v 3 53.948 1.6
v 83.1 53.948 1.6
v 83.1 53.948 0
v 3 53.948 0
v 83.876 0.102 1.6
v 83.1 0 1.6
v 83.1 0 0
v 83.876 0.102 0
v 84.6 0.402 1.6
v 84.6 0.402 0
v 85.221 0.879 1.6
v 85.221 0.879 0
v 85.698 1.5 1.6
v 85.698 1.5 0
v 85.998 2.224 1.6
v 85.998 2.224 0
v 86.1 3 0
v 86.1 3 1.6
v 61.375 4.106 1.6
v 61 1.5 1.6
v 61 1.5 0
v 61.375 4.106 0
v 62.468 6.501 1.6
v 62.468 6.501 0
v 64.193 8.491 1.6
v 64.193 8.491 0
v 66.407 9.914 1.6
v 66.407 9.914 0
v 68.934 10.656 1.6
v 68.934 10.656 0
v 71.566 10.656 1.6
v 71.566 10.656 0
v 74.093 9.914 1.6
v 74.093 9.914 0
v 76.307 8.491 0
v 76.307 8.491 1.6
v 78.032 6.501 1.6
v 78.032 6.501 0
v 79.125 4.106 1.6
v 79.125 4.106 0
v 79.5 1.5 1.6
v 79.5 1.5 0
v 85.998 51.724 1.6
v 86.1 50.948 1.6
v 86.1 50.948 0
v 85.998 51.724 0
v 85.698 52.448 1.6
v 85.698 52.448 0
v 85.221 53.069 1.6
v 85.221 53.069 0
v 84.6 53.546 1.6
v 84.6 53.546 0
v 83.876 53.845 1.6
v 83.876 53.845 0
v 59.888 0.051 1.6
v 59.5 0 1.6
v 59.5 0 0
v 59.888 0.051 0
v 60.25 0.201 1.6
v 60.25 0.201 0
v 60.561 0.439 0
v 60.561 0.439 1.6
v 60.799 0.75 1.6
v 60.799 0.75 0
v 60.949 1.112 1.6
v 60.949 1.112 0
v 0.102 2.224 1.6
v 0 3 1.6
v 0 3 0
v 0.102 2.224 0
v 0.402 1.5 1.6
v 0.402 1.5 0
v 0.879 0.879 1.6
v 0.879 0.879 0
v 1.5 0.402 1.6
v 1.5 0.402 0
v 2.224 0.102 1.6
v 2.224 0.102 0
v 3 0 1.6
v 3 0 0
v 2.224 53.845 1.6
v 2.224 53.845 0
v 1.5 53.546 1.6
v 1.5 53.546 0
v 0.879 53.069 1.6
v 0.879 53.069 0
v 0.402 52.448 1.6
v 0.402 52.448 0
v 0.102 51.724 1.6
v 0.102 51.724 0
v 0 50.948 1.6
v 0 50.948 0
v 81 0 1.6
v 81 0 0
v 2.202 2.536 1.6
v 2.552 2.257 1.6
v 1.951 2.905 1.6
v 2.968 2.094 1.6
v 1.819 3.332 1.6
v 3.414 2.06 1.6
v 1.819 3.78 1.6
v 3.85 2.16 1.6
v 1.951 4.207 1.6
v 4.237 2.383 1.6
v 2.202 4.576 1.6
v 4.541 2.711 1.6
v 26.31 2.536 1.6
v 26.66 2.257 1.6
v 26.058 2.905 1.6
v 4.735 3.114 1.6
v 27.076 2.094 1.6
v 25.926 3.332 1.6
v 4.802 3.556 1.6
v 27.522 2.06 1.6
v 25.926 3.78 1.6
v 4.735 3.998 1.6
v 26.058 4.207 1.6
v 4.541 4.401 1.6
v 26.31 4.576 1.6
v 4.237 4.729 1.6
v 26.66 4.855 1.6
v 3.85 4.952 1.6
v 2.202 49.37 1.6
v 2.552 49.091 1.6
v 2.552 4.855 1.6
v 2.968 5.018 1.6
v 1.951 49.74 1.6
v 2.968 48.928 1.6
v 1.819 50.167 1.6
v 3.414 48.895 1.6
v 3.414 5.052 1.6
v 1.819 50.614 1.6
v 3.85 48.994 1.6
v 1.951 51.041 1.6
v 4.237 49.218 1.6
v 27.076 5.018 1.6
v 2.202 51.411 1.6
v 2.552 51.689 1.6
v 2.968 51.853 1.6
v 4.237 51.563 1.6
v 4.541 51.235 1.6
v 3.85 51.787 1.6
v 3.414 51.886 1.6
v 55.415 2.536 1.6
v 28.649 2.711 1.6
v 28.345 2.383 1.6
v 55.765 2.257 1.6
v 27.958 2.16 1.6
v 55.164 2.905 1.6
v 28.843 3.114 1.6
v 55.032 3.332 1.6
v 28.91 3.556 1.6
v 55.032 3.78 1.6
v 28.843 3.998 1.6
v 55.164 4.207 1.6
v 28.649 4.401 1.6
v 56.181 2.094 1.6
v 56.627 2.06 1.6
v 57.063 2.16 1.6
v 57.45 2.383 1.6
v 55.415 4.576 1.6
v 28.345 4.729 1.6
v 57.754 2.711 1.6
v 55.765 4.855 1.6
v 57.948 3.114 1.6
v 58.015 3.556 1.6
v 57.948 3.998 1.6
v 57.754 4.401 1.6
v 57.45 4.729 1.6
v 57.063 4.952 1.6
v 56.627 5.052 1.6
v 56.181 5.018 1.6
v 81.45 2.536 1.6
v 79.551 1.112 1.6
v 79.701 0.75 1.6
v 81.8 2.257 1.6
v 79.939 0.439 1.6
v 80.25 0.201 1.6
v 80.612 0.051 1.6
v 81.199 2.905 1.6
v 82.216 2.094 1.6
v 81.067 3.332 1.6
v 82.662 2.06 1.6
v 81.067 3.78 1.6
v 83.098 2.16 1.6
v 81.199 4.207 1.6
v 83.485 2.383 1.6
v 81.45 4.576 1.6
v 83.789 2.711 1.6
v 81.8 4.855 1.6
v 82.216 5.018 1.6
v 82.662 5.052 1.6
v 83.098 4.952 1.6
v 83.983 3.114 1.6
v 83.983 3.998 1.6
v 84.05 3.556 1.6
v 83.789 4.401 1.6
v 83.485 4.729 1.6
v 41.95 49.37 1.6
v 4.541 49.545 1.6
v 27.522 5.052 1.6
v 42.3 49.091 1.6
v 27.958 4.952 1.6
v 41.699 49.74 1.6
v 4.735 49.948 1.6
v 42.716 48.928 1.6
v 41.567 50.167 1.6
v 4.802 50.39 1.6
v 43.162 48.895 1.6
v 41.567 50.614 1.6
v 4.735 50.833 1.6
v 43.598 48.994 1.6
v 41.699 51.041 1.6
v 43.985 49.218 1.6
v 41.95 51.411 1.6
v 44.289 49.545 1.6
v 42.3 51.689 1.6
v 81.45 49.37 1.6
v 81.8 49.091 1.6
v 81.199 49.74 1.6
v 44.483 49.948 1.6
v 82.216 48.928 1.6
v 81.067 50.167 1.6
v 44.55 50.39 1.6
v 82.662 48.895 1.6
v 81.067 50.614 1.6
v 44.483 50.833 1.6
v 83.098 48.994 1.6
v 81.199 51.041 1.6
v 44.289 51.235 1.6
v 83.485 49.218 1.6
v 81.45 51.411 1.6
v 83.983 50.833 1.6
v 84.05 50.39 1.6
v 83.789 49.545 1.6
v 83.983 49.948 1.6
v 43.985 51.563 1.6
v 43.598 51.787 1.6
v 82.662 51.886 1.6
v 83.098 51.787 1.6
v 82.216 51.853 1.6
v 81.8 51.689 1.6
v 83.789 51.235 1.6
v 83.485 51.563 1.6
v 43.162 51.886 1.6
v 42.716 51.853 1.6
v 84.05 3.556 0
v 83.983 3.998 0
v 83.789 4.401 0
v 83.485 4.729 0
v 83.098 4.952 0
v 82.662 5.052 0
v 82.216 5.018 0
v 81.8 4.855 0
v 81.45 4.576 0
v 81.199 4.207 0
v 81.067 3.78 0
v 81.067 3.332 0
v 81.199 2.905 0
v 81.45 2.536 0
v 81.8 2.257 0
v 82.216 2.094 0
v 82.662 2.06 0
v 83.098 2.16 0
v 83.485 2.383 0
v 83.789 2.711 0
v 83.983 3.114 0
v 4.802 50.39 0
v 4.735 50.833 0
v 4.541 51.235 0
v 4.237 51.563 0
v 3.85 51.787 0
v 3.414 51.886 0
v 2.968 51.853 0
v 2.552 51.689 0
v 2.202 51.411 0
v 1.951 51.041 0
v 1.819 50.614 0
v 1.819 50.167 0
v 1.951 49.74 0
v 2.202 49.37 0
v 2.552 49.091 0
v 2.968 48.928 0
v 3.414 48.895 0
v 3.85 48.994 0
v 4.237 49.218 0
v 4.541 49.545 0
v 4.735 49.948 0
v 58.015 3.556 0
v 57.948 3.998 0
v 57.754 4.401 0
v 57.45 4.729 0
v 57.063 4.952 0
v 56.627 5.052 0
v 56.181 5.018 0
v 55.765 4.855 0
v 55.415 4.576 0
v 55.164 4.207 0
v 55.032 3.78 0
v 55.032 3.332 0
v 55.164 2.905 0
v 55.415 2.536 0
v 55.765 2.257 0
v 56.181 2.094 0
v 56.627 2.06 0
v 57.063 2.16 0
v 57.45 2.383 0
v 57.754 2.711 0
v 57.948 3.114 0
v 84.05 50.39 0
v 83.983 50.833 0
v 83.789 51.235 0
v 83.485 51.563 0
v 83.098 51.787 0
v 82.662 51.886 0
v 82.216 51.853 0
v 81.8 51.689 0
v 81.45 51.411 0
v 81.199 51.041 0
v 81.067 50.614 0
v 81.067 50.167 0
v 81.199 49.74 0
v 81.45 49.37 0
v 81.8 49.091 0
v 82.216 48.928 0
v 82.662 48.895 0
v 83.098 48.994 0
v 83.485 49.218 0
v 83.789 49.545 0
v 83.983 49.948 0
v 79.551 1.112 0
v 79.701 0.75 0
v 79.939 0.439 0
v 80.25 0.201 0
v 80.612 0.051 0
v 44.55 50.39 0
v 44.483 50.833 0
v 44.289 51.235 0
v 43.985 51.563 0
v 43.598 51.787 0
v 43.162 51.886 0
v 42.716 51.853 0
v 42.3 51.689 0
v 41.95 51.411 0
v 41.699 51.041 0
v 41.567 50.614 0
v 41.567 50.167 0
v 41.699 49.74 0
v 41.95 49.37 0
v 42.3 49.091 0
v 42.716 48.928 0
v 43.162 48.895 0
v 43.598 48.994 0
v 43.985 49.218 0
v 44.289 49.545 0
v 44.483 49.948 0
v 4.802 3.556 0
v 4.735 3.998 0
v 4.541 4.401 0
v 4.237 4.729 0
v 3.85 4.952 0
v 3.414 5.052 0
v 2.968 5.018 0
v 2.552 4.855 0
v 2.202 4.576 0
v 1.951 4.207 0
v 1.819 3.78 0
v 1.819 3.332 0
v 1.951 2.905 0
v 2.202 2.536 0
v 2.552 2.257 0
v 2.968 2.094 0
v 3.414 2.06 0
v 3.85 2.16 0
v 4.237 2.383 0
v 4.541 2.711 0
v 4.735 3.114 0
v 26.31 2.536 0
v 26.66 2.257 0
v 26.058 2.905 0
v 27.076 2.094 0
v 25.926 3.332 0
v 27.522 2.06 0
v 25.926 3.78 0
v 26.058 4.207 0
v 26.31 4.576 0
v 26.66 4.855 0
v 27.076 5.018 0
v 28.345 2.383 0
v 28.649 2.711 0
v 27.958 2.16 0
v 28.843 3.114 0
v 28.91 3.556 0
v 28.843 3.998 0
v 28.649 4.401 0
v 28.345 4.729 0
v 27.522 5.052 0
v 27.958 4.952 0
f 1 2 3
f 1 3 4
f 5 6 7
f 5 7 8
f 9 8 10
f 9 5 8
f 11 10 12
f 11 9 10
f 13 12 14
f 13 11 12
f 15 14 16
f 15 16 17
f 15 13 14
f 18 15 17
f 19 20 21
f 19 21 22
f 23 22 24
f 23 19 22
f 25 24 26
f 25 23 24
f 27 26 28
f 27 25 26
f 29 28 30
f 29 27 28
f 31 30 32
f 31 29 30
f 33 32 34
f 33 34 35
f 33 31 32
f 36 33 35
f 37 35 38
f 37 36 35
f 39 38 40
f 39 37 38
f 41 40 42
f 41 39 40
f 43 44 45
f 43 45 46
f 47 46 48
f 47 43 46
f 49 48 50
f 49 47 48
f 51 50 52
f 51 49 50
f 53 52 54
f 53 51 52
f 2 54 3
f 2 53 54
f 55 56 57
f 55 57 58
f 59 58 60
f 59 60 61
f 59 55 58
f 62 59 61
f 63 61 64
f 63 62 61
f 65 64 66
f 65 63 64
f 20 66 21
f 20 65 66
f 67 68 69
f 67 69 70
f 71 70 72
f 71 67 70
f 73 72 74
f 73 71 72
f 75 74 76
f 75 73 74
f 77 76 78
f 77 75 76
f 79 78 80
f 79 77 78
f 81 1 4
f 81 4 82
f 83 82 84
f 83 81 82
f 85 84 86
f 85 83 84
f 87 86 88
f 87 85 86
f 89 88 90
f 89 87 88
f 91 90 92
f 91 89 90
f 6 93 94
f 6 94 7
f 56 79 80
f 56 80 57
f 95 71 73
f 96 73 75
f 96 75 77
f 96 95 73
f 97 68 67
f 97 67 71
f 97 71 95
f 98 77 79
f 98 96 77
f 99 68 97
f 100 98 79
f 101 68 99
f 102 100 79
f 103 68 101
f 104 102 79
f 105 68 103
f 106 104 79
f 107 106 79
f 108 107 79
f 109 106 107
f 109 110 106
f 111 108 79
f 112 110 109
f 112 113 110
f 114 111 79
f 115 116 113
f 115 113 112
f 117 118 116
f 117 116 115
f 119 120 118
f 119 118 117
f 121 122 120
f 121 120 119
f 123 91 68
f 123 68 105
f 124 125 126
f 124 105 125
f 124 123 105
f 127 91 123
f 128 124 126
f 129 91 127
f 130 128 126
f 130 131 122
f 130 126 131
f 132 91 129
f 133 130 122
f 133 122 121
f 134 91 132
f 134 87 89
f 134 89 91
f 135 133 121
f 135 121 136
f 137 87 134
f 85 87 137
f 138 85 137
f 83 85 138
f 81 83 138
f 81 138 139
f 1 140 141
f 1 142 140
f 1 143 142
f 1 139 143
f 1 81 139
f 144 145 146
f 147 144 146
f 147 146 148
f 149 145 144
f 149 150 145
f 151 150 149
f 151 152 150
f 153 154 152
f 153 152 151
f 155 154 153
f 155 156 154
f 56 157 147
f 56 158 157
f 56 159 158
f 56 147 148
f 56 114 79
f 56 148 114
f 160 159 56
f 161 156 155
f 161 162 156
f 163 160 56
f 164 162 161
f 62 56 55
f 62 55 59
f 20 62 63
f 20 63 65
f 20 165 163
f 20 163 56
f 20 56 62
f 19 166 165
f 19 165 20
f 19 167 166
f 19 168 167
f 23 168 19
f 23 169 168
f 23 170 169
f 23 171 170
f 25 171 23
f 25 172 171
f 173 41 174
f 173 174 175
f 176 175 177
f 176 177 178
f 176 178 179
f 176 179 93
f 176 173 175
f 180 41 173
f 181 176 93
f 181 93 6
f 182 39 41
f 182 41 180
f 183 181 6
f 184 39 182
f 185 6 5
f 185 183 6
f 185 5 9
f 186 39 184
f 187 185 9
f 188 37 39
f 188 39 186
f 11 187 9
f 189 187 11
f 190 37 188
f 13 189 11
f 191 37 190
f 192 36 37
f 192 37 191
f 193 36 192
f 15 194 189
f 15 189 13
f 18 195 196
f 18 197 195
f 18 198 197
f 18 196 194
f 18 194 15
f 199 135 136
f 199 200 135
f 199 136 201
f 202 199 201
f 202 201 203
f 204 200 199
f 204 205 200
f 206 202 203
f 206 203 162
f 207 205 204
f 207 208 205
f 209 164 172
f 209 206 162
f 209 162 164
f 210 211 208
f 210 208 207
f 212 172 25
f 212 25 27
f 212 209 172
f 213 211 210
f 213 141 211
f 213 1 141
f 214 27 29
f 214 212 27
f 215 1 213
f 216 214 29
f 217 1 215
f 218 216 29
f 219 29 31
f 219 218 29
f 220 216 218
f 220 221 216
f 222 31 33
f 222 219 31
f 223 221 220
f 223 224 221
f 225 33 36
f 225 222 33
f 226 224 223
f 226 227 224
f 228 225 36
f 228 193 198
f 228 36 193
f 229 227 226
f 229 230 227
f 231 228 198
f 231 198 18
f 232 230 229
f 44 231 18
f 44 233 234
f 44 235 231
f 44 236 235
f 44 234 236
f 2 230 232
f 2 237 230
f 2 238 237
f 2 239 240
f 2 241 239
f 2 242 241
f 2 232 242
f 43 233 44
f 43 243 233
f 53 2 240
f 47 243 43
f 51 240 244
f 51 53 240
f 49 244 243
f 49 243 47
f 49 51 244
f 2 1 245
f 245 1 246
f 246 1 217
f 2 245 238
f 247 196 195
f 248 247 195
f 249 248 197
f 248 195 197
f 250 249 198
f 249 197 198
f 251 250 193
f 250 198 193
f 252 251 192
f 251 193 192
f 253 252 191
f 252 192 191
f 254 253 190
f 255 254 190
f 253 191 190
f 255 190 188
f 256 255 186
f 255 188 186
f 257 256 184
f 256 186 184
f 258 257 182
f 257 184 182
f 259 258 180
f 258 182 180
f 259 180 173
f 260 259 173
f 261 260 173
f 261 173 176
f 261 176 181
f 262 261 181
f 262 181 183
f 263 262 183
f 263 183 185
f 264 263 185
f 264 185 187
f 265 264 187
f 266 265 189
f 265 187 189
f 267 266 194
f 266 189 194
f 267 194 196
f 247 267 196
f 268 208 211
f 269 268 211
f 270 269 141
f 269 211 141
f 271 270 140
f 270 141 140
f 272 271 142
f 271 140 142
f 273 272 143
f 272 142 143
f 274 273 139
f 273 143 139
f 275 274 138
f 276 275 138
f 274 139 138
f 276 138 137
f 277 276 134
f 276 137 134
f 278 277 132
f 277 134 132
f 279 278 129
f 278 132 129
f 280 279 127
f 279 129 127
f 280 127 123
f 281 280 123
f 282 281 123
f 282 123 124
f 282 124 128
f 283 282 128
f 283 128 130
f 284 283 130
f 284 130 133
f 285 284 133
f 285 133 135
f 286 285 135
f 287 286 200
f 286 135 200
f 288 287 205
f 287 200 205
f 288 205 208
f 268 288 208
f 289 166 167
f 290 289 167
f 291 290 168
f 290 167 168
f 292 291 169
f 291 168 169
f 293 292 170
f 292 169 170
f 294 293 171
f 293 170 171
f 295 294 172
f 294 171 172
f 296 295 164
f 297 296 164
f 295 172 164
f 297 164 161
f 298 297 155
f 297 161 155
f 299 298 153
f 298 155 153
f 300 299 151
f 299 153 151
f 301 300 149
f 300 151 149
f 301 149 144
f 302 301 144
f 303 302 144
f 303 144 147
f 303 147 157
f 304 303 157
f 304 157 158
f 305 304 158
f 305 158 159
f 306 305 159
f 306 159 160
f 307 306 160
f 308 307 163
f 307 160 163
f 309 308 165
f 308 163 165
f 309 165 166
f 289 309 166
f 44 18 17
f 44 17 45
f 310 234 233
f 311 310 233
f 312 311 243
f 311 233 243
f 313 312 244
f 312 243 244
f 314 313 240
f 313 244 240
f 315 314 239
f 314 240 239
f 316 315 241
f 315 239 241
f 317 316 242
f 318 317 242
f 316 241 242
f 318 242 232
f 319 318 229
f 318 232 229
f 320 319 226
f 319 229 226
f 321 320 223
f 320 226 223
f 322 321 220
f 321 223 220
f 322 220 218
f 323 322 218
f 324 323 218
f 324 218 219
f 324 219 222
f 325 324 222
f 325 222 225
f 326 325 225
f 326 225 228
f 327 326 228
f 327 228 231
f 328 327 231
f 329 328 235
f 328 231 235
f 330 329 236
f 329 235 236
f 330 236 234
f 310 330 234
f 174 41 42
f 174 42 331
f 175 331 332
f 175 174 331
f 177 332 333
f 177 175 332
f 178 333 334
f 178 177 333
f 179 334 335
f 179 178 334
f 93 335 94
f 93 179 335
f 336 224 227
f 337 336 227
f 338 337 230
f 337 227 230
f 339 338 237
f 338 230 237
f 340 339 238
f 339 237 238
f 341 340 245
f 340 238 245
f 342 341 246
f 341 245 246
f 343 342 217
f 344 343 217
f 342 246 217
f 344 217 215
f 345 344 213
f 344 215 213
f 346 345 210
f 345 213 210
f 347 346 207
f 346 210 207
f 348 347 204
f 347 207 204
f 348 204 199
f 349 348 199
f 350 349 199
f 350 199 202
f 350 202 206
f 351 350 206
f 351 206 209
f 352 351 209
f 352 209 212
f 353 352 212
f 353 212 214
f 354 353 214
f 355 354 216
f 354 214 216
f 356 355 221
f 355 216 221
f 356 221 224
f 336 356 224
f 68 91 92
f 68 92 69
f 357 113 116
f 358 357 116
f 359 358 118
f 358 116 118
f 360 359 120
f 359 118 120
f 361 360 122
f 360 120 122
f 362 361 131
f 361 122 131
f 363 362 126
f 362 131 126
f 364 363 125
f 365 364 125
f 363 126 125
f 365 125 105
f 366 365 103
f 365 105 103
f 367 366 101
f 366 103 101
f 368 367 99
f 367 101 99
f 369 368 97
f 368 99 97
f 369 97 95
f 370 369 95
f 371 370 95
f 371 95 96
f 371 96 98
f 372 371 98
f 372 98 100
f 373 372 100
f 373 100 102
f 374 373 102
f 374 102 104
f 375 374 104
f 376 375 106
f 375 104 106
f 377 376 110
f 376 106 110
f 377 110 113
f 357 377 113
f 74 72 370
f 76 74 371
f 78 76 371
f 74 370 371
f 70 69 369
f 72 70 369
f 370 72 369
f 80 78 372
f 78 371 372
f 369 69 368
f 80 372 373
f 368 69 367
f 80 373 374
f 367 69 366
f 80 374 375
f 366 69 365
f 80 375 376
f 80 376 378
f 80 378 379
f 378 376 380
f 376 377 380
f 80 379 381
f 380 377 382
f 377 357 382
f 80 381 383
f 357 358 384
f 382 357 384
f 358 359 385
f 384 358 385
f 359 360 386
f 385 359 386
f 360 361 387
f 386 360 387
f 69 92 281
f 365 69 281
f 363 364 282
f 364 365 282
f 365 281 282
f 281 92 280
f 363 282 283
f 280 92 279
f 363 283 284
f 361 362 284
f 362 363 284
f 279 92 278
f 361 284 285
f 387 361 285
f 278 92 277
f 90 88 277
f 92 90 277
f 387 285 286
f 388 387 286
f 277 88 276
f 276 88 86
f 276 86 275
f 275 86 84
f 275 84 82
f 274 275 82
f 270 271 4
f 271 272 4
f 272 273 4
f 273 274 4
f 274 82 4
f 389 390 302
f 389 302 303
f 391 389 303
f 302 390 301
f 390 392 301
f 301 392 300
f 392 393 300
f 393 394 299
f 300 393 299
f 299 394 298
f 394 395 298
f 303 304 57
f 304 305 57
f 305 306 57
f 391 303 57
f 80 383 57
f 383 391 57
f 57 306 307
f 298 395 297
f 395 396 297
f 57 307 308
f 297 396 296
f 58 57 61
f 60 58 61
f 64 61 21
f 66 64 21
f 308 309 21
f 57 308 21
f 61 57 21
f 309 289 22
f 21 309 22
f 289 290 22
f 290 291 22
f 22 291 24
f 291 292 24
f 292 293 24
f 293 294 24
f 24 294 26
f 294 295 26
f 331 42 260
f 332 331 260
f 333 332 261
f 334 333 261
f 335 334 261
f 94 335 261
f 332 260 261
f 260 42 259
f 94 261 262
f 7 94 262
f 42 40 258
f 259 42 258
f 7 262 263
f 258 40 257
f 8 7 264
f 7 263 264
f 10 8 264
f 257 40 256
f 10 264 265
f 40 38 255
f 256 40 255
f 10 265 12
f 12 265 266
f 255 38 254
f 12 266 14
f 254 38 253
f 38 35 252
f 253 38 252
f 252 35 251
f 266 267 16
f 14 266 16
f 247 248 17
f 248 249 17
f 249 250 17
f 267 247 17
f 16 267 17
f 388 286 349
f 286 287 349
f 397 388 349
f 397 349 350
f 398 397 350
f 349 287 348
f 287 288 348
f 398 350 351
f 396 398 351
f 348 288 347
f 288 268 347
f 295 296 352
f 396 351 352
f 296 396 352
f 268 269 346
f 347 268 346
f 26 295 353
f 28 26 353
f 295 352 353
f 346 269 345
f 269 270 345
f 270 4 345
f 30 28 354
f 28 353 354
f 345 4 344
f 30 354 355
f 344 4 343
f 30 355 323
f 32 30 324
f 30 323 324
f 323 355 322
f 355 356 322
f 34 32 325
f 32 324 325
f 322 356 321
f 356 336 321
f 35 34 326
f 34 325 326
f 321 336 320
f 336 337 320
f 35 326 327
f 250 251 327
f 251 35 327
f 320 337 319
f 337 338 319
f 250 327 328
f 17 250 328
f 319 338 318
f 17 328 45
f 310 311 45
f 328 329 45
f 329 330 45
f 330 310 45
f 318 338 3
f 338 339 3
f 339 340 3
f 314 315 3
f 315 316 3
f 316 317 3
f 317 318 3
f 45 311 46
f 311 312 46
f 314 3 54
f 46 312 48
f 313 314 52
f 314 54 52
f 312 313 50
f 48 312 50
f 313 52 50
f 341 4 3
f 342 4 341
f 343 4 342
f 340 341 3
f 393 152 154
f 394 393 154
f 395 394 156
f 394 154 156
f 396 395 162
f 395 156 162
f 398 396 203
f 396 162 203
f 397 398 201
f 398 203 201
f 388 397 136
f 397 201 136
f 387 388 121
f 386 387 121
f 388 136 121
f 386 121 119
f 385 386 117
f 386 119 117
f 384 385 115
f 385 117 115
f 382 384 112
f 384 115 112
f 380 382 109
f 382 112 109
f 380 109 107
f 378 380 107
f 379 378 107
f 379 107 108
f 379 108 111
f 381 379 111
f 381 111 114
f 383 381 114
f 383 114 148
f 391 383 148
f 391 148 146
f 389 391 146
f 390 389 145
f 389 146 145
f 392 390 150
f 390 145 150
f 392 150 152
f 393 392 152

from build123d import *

# Parameters (mm, degrees)
SKETCH1_R           = 1.5
SKETCH1_R_2         = 1.4999995
BOSS_EXTRUDE1_DEPTH = 1.6


with BuildPart() as part:
    # Sketch1 → Boss-Extrude1 (new body)
    with BuildSketch(Plane.XY.offset(1.6)):
        with BuildLine():
            Line((0, 50.9476), (0, 3))
            ThreePointArc((0, 3), (0.878679656, 0.878679656), (3, 0))
            Line((3, 0), (59.5, 0))
            ThreePointArc((59.5, 0), (60.560660172, 0.439339828), (61, 1.5))
            ThreePointArc((61, 1.5), (70.25, 10.75), (79.5, 1.5))
            ThreePointArc((79.5, 1.5), (79.939339828, 0.439339828), (81, 0))
            Line((81, 0), (83.1, 0))
            ThreePointArc((83.1, 0), (85.221320344, 0.878679656), (86.1, 3))
            Line((86.1, 3), (86.1, 50.9476))
            ThreePointArc((86.1, 50.9476), (85.221320344, 53.068920344), (83.1, 53.9476))
            Line((83.1, 53.9476), (3, 53.9476))
            ThreePointArc((3, 53.9476), (0.878679656, 53.068920344), (0, 50.9476))
        make_face()
        with Locations((3.302, 50.3904)):
            Circle(SKETCH1_R, mode=Mode.SUBTRACT)
        with Locations((3.302, 3.556)):
            Circle(SKETCH1_R, mode=Mode.SUBTRACT)
        with Locations((82.55, 3.556)):
            Circle(SKETCH1_R, mode=Mode.SUBTRACT)
        with Locations((82.55, 50.3904)):
            Circle(SKETCH1_R, mode=Mode.SUBTRACT)
        with Locations((27.4096, 3.556)):
            Circle(SKETCH1_R_2, mode=Mode.SUBTRACT)
        with Locations((56.515, 3.556)):
            Circle(SKETCH1_R, mode=Mode.SUBTRACT)
        with Locations((43.05, 50.3904)):
            Circle(SKETCH1_R, mode=Mode.SUBTRACT)
    extrude(amount=-BOSS_EXTRUDE1_DEPTH)


solid = part.part
